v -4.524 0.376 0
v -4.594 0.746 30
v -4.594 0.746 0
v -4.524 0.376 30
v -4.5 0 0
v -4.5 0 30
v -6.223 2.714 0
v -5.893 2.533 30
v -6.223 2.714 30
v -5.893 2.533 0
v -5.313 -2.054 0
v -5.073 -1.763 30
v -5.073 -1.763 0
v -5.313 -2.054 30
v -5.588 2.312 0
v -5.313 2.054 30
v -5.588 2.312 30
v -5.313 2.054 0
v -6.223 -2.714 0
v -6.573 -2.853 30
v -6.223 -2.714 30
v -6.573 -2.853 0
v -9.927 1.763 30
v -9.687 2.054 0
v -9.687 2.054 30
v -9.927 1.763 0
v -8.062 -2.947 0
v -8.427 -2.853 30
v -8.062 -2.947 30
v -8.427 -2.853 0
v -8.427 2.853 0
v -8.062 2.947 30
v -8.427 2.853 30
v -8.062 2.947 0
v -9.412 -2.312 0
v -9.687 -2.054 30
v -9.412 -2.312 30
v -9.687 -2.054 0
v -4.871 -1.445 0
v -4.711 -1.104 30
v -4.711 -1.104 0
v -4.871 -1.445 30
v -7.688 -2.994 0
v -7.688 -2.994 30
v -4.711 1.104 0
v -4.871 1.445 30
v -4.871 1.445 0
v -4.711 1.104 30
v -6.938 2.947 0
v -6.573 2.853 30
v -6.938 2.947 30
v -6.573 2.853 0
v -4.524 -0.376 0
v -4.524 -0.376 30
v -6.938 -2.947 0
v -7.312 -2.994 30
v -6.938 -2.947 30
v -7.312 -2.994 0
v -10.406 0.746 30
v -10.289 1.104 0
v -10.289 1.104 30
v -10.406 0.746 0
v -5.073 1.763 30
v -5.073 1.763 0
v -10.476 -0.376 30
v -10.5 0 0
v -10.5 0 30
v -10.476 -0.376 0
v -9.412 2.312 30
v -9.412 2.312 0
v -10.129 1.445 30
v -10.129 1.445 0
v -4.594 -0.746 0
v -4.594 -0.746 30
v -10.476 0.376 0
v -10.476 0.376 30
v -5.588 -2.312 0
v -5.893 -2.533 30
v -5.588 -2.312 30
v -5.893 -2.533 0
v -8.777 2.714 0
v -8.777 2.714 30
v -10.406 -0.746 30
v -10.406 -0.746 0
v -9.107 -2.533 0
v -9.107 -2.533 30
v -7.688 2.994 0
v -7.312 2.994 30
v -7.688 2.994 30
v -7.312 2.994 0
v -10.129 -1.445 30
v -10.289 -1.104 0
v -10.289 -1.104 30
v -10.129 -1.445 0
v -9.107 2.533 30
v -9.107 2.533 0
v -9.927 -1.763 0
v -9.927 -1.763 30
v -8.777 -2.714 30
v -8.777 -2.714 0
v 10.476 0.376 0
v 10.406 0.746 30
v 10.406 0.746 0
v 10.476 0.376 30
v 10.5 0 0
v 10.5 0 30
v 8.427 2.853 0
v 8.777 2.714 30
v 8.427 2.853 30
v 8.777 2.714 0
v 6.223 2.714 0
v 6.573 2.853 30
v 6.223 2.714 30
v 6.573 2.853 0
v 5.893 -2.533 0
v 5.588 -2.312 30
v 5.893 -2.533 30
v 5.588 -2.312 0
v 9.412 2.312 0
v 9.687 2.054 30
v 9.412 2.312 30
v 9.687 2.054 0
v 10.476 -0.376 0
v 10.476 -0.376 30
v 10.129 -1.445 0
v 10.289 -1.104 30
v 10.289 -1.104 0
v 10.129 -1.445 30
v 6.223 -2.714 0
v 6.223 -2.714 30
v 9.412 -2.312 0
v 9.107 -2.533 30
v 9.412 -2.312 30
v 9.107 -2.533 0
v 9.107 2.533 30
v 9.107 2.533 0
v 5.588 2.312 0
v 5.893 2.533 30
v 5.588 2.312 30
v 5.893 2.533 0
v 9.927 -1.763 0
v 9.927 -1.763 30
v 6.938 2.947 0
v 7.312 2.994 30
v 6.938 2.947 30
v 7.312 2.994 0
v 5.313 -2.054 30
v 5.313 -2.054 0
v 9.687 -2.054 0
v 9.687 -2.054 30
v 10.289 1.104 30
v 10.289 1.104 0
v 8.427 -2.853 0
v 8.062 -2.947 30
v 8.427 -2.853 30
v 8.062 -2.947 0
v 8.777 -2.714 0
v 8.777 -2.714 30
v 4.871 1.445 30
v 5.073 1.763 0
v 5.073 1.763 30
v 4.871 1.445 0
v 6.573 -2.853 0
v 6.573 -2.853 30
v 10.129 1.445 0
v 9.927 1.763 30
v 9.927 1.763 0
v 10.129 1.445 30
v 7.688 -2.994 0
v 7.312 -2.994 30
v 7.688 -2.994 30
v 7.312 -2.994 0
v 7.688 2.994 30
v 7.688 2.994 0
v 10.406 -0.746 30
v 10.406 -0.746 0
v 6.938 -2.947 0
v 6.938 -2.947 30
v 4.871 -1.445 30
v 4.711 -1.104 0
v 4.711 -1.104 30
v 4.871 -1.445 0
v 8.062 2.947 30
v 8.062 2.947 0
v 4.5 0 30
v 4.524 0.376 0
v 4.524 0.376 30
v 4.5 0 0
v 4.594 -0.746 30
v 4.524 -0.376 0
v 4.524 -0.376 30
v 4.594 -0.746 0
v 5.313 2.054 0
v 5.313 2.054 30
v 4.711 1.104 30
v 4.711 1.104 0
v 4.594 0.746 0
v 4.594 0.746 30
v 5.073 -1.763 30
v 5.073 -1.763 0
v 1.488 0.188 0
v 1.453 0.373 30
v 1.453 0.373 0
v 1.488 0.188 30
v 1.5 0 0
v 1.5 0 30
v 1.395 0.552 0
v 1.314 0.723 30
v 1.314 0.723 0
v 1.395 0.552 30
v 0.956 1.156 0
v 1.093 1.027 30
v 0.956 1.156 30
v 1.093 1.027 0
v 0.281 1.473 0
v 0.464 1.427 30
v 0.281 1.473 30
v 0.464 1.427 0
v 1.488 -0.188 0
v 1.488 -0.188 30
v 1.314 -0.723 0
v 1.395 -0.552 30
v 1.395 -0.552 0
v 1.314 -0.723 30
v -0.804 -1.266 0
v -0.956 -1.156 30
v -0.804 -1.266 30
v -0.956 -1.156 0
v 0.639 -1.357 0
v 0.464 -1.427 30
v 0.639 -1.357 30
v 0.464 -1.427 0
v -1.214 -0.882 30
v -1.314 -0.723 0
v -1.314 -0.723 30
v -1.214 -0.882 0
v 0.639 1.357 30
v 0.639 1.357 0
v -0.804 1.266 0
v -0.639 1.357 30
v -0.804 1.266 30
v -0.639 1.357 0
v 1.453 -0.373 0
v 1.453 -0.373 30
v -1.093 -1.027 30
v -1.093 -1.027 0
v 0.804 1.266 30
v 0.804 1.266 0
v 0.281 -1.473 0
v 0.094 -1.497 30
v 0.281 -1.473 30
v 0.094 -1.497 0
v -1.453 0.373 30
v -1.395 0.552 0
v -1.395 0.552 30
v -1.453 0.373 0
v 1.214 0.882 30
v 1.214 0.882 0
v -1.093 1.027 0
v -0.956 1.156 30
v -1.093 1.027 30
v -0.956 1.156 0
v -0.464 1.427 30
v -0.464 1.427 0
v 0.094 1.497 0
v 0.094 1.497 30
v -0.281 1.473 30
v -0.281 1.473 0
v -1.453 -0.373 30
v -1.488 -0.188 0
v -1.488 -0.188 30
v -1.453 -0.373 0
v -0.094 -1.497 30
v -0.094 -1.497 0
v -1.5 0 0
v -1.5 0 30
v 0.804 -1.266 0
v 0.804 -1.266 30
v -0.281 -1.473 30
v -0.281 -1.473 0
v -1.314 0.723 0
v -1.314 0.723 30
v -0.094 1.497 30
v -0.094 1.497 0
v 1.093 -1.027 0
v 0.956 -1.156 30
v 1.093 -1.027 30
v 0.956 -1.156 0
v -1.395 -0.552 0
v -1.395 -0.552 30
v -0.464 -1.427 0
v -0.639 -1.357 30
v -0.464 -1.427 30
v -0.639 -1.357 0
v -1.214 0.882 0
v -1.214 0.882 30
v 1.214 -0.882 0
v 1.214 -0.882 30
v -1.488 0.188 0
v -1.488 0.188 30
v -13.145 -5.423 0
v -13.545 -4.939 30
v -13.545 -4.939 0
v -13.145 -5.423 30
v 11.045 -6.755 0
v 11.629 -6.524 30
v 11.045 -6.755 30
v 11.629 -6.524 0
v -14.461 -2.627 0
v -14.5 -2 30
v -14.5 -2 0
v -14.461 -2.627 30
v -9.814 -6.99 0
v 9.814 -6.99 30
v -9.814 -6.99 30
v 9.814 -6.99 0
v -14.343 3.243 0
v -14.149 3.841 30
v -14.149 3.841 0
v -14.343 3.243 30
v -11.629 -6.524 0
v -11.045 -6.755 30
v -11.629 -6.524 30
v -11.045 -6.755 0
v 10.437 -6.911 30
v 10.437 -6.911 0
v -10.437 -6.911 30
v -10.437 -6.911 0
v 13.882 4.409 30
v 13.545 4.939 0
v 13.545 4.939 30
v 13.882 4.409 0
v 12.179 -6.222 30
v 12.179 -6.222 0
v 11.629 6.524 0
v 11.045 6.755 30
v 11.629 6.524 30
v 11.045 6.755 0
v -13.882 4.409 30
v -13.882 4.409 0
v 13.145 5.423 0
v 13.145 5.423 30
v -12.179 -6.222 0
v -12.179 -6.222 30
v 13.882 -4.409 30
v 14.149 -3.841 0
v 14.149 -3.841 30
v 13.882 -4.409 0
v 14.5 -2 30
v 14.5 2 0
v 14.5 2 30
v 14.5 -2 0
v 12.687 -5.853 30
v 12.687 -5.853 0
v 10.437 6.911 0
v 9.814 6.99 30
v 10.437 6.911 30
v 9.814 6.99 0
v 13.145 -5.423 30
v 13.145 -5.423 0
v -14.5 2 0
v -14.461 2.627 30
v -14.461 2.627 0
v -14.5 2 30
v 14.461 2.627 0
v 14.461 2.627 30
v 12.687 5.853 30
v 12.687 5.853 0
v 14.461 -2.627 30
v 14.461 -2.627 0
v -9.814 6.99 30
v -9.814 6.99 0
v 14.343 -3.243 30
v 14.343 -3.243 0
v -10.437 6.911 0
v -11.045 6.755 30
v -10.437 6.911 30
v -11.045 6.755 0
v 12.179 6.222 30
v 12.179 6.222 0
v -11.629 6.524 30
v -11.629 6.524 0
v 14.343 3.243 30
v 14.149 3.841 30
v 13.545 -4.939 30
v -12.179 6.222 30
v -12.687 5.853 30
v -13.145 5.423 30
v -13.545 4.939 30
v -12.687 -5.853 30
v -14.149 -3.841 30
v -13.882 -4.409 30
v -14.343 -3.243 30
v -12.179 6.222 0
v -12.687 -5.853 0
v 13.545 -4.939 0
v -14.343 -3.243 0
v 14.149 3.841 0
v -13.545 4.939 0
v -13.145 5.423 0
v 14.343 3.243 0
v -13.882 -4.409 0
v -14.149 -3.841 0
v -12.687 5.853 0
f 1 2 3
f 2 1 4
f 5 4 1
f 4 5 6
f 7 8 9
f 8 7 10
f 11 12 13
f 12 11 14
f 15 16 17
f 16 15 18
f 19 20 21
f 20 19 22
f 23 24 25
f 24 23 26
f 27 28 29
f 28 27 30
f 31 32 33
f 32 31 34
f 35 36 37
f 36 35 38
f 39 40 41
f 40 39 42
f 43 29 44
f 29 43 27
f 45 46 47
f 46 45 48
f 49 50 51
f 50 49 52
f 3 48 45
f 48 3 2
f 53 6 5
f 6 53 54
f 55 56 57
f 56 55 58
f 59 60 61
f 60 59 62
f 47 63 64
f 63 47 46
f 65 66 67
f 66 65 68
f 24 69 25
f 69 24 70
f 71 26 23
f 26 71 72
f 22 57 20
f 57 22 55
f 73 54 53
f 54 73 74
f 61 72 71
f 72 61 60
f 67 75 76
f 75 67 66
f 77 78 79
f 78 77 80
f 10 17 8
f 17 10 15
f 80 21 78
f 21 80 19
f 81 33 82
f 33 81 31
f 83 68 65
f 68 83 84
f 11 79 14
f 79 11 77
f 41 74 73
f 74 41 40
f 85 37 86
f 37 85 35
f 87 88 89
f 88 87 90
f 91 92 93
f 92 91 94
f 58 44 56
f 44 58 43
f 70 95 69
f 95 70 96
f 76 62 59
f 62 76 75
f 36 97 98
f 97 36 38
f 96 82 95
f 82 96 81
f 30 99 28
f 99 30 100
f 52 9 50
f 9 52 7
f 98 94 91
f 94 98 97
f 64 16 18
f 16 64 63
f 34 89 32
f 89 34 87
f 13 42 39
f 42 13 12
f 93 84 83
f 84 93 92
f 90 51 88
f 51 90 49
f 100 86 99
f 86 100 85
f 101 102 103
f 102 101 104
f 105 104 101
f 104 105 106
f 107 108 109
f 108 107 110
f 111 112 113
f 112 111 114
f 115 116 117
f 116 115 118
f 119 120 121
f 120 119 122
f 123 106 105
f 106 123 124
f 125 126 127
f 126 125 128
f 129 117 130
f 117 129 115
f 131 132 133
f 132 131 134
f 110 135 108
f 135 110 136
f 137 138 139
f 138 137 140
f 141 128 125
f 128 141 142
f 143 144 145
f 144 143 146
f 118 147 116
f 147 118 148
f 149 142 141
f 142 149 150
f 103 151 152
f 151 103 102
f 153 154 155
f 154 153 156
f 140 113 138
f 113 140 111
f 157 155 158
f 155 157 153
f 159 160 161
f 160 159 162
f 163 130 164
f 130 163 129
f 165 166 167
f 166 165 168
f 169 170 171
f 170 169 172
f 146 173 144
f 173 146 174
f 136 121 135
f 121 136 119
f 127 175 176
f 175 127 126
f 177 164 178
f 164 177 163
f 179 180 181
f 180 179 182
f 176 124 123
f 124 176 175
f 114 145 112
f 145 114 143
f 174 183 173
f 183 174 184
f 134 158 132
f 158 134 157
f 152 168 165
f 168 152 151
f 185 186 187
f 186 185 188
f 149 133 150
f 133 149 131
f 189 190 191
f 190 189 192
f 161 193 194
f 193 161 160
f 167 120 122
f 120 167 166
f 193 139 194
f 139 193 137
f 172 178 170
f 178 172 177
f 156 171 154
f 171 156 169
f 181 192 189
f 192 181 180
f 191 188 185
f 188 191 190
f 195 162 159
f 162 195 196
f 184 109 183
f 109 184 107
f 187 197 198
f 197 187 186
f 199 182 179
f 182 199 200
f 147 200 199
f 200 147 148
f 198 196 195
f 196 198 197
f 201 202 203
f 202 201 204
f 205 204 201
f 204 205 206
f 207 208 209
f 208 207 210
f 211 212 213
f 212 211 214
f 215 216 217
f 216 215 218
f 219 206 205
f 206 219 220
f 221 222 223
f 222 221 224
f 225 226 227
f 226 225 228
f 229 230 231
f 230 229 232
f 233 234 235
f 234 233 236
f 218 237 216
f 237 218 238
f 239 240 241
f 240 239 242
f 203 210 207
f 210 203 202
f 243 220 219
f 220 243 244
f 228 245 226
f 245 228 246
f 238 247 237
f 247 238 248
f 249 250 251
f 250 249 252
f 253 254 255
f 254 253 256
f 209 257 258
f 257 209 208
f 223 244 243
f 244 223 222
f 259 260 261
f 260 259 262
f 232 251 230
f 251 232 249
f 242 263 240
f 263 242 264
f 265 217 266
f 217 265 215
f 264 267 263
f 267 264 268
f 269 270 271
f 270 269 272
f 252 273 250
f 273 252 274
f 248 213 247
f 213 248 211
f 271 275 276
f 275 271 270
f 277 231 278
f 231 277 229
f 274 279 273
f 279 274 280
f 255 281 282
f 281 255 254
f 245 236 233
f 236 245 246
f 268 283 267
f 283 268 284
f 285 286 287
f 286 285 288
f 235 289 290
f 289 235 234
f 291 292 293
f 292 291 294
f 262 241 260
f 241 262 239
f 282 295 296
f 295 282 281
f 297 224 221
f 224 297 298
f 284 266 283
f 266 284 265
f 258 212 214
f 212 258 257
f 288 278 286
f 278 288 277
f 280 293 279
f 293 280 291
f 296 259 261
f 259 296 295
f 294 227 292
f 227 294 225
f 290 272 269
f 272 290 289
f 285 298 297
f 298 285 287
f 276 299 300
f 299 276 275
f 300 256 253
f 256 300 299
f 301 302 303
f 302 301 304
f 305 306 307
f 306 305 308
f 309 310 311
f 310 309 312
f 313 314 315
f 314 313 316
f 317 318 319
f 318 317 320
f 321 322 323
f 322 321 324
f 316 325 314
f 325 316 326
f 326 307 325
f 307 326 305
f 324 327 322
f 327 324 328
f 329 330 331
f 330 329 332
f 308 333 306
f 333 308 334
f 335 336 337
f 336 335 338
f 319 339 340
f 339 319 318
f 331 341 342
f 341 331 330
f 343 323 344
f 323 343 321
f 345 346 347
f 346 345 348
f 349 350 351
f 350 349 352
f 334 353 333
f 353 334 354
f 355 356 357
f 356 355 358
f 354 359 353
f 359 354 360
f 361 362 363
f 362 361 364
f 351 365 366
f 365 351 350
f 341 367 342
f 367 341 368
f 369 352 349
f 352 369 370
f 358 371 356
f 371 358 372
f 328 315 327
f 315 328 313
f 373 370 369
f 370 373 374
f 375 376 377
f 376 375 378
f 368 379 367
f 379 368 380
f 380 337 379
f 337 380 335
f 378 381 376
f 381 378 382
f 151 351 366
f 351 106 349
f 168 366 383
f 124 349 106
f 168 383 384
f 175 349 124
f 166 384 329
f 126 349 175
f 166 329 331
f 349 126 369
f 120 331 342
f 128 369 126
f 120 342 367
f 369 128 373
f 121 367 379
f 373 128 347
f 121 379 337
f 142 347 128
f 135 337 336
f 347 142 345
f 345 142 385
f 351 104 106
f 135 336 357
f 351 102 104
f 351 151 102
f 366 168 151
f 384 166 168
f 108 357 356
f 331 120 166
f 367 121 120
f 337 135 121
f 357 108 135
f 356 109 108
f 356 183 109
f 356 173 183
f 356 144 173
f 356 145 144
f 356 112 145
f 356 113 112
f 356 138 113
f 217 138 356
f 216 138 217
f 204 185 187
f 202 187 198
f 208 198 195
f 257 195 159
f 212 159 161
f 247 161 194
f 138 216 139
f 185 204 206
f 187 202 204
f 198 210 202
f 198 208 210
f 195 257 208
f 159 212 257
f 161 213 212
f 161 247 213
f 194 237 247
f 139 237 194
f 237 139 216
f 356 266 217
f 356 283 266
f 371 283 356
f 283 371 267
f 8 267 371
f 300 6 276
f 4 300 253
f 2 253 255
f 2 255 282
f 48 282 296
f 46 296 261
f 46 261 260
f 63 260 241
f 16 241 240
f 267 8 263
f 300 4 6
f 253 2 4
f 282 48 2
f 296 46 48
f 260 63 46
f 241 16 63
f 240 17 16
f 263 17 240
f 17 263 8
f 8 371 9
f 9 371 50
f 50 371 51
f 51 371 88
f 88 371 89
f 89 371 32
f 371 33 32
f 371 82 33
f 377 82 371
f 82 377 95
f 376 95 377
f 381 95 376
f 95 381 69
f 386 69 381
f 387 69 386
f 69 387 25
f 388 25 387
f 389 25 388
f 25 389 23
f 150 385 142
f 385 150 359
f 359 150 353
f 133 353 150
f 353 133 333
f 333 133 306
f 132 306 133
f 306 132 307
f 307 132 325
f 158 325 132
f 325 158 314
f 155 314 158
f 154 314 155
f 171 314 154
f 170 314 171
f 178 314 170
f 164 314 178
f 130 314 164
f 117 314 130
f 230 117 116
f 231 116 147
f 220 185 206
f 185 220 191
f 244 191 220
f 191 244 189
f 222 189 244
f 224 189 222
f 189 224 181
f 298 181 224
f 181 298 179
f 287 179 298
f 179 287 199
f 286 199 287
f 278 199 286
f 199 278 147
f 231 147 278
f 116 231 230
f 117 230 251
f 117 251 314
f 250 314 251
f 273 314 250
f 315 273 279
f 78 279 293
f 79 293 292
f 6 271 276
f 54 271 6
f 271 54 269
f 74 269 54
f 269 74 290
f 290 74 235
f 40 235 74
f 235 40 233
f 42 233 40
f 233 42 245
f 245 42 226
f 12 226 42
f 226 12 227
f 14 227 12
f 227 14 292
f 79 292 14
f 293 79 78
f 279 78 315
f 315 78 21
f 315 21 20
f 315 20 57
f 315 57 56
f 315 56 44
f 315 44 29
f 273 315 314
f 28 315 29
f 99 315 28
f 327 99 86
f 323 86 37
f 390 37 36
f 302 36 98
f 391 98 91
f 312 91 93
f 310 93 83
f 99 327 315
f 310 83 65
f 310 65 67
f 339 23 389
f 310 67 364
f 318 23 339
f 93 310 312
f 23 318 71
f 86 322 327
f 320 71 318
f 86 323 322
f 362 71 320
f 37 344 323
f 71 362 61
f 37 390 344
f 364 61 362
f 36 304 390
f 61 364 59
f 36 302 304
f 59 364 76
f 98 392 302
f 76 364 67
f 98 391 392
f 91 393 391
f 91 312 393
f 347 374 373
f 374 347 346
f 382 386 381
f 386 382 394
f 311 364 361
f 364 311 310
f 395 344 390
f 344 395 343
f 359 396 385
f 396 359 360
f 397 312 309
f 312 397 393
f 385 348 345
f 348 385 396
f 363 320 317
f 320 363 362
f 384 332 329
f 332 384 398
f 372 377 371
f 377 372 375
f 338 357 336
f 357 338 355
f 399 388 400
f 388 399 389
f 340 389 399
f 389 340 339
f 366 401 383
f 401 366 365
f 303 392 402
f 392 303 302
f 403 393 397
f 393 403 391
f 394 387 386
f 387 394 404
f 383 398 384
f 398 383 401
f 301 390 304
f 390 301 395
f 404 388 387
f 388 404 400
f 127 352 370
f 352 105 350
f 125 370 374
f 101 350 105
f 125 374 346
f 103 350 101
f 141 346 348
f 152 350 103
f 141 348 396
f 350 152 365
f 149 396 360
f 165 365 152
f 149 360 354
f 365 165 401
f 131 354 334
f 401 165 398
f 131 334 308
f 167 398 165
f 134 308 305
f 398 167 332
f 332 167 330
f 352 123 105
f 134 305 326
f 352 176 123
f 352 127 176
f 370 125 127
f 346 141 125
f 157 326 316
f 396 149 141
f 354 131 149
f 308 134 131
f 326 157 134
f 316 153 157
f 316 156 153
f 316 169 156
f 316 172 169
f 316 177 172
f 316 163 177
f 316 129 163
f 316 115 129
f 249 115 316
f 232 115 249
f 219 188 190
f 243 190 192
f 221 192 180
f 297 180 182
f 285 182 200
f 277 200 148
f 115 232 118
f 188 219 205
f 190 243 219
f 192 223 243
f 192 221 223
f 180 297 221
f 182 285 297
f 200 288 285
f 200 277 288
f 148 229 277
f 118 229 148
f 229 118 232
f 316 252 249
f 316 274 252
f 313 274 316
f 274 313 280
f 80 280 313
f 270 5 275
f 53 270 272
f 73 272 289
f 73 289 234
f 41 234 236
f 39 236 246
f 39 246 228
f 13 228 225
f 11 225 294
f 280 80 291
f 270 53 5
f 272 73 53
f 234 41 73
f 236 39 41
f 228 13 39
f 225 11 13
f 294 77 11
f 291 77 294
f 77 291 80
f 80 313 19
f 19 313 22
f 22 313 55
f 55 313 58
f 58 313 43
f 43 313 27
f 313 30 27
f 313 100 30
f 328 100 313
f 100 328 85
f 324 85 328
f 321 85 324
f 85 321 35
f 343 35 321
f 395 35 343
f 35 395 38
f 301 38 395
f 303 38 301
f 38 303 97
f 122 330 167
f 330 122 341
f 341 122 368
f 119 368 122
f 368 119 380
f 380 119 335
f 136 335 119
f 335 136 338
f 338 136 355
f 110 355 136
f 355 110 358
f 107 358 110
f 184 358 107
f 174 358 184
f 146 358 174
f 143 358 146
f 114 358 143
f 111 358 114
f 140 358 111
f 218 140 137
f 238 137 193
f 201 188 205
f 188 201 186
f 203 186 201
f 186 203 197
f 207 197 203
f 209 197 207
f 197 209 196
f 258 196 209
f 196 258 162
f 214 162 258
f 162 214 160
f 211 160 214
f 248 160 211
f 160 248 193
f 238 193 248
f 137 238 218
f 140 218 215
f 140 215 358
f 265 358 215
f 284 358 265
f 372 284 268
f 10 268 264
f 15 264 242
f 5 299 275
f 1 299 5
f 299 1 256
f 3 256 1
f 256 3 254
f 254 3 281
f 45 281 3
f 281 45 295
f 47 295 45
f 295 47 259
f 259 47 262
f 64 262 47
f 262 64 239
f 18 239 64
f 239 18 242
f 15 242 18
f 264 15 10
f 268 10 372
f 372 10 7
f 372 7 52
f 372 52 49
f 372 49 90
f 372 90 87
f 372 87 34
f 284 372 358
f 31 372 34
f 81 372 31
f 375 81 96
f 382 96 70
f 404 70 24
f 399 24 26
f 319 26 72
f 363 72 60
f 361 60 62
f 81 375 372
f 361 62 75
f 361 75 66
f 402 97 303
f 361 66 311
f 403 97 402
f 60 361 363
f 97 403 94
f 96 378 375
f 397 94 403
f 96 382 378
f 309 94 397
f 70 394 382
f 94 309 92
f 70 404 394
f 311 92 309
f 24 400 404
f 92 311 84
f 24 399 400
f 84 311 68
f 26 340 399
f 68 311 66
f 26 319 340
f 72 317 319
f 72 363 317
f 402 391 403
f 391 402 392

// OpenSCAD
$fn = 50;


difference() {
	union() {
		*color(alpha = 1.0000000000, c = "gray") {
			translate(v = [0, 7, 0]) {
				linear_extrude(height = 1) {
					text(font = "Arial:style=Bold", halign = "center", size = 4.5000000000, text = "COMMENT plate main", valign = "center");
				}
			}
		}
		*color(alpha = 1.0000000000, c = "gray") {
			translate(v = [0, 14, 0]) {
				linear_extrude(height = 1) {
					text(font = "Arial:style=Bold", halign = "center", size = 4.5000000000, text = "COMMENT description oobb_plate_shape_p_type_30_depth_2_width_1_height_30_thickness_true_both_holes", valign = "center");
				}
			}
		}
		hull() {
			translate(v = [-9.5000000000, 2.0000000000, 0]) {
				cylinder(h = 30, r = 5);
			}
			translate(v = [9.5000000000, 2.0000000000, 0]) {
				cylinder(h = 30, r = 5);
			}
			translate(v = [-9.5000000000, -2.0000000000, 0]) {
				cylinder(h = 30, r = 5);
			}
			translate(v = [9.5000000000, -2.0000000000, 0]) {
				cylinder(h = 30, r = 5);
			}
		}
	}
	union() {
		*color(alpha = 1.0000000000, c = "gray") {
			translate(v = [0, 7, 0]) {
				linear_extrude(height = 1) {
					text(font = "Arial:style=Bold", halign = "center", size = 4.5000000000, text = "COMMENT holes main", valign = "center");
				}
			}
		}
		*color(alpha = 1.0000000000, c = "gray") {
			translate(v = [0, 14, 0]) {
				linear_extrude(height = 1) {
					text(font = "Arial:style=Bold", halign = "center", size = 4.5000000000, text = "COMMENT description oobb_holes_shape_n_type_2_width_1_height_30_thickness_true_both_holes", valign = "center");
				}
			}
		}
		translate(v = [-7.5000000000, 0.0000000000, 0]) {
			translate(v = [0, 0, -50]) {
				cylinder(h = 100, r = 3.0000000000);
			}
		}
		translate(v = [7.5000000000, 0.0000000000, 0]) {
			translate(v = [0, 0, -50]) {
				cylinder(h = 100, r = 3.0000000000);
			}
		}
		translate(v = [-7.5000000000, 0.0000000000, 0]) {
			translate(v = [0, 0, -50]) {
				cylinder(h = 100, r = 1.5000000000);
			}
		}
		translate(v = [0, 0, -50]) {
			cylinder(h = 100, r = 1.5000000000);
		}
		translate(v = [7.5000000000, 0.0000000000, 0]) {
			translate(v = [0, 0, -50]) {
				cylinder(h = 100, r = 1.5000000000);
			}
		}
	}
}
